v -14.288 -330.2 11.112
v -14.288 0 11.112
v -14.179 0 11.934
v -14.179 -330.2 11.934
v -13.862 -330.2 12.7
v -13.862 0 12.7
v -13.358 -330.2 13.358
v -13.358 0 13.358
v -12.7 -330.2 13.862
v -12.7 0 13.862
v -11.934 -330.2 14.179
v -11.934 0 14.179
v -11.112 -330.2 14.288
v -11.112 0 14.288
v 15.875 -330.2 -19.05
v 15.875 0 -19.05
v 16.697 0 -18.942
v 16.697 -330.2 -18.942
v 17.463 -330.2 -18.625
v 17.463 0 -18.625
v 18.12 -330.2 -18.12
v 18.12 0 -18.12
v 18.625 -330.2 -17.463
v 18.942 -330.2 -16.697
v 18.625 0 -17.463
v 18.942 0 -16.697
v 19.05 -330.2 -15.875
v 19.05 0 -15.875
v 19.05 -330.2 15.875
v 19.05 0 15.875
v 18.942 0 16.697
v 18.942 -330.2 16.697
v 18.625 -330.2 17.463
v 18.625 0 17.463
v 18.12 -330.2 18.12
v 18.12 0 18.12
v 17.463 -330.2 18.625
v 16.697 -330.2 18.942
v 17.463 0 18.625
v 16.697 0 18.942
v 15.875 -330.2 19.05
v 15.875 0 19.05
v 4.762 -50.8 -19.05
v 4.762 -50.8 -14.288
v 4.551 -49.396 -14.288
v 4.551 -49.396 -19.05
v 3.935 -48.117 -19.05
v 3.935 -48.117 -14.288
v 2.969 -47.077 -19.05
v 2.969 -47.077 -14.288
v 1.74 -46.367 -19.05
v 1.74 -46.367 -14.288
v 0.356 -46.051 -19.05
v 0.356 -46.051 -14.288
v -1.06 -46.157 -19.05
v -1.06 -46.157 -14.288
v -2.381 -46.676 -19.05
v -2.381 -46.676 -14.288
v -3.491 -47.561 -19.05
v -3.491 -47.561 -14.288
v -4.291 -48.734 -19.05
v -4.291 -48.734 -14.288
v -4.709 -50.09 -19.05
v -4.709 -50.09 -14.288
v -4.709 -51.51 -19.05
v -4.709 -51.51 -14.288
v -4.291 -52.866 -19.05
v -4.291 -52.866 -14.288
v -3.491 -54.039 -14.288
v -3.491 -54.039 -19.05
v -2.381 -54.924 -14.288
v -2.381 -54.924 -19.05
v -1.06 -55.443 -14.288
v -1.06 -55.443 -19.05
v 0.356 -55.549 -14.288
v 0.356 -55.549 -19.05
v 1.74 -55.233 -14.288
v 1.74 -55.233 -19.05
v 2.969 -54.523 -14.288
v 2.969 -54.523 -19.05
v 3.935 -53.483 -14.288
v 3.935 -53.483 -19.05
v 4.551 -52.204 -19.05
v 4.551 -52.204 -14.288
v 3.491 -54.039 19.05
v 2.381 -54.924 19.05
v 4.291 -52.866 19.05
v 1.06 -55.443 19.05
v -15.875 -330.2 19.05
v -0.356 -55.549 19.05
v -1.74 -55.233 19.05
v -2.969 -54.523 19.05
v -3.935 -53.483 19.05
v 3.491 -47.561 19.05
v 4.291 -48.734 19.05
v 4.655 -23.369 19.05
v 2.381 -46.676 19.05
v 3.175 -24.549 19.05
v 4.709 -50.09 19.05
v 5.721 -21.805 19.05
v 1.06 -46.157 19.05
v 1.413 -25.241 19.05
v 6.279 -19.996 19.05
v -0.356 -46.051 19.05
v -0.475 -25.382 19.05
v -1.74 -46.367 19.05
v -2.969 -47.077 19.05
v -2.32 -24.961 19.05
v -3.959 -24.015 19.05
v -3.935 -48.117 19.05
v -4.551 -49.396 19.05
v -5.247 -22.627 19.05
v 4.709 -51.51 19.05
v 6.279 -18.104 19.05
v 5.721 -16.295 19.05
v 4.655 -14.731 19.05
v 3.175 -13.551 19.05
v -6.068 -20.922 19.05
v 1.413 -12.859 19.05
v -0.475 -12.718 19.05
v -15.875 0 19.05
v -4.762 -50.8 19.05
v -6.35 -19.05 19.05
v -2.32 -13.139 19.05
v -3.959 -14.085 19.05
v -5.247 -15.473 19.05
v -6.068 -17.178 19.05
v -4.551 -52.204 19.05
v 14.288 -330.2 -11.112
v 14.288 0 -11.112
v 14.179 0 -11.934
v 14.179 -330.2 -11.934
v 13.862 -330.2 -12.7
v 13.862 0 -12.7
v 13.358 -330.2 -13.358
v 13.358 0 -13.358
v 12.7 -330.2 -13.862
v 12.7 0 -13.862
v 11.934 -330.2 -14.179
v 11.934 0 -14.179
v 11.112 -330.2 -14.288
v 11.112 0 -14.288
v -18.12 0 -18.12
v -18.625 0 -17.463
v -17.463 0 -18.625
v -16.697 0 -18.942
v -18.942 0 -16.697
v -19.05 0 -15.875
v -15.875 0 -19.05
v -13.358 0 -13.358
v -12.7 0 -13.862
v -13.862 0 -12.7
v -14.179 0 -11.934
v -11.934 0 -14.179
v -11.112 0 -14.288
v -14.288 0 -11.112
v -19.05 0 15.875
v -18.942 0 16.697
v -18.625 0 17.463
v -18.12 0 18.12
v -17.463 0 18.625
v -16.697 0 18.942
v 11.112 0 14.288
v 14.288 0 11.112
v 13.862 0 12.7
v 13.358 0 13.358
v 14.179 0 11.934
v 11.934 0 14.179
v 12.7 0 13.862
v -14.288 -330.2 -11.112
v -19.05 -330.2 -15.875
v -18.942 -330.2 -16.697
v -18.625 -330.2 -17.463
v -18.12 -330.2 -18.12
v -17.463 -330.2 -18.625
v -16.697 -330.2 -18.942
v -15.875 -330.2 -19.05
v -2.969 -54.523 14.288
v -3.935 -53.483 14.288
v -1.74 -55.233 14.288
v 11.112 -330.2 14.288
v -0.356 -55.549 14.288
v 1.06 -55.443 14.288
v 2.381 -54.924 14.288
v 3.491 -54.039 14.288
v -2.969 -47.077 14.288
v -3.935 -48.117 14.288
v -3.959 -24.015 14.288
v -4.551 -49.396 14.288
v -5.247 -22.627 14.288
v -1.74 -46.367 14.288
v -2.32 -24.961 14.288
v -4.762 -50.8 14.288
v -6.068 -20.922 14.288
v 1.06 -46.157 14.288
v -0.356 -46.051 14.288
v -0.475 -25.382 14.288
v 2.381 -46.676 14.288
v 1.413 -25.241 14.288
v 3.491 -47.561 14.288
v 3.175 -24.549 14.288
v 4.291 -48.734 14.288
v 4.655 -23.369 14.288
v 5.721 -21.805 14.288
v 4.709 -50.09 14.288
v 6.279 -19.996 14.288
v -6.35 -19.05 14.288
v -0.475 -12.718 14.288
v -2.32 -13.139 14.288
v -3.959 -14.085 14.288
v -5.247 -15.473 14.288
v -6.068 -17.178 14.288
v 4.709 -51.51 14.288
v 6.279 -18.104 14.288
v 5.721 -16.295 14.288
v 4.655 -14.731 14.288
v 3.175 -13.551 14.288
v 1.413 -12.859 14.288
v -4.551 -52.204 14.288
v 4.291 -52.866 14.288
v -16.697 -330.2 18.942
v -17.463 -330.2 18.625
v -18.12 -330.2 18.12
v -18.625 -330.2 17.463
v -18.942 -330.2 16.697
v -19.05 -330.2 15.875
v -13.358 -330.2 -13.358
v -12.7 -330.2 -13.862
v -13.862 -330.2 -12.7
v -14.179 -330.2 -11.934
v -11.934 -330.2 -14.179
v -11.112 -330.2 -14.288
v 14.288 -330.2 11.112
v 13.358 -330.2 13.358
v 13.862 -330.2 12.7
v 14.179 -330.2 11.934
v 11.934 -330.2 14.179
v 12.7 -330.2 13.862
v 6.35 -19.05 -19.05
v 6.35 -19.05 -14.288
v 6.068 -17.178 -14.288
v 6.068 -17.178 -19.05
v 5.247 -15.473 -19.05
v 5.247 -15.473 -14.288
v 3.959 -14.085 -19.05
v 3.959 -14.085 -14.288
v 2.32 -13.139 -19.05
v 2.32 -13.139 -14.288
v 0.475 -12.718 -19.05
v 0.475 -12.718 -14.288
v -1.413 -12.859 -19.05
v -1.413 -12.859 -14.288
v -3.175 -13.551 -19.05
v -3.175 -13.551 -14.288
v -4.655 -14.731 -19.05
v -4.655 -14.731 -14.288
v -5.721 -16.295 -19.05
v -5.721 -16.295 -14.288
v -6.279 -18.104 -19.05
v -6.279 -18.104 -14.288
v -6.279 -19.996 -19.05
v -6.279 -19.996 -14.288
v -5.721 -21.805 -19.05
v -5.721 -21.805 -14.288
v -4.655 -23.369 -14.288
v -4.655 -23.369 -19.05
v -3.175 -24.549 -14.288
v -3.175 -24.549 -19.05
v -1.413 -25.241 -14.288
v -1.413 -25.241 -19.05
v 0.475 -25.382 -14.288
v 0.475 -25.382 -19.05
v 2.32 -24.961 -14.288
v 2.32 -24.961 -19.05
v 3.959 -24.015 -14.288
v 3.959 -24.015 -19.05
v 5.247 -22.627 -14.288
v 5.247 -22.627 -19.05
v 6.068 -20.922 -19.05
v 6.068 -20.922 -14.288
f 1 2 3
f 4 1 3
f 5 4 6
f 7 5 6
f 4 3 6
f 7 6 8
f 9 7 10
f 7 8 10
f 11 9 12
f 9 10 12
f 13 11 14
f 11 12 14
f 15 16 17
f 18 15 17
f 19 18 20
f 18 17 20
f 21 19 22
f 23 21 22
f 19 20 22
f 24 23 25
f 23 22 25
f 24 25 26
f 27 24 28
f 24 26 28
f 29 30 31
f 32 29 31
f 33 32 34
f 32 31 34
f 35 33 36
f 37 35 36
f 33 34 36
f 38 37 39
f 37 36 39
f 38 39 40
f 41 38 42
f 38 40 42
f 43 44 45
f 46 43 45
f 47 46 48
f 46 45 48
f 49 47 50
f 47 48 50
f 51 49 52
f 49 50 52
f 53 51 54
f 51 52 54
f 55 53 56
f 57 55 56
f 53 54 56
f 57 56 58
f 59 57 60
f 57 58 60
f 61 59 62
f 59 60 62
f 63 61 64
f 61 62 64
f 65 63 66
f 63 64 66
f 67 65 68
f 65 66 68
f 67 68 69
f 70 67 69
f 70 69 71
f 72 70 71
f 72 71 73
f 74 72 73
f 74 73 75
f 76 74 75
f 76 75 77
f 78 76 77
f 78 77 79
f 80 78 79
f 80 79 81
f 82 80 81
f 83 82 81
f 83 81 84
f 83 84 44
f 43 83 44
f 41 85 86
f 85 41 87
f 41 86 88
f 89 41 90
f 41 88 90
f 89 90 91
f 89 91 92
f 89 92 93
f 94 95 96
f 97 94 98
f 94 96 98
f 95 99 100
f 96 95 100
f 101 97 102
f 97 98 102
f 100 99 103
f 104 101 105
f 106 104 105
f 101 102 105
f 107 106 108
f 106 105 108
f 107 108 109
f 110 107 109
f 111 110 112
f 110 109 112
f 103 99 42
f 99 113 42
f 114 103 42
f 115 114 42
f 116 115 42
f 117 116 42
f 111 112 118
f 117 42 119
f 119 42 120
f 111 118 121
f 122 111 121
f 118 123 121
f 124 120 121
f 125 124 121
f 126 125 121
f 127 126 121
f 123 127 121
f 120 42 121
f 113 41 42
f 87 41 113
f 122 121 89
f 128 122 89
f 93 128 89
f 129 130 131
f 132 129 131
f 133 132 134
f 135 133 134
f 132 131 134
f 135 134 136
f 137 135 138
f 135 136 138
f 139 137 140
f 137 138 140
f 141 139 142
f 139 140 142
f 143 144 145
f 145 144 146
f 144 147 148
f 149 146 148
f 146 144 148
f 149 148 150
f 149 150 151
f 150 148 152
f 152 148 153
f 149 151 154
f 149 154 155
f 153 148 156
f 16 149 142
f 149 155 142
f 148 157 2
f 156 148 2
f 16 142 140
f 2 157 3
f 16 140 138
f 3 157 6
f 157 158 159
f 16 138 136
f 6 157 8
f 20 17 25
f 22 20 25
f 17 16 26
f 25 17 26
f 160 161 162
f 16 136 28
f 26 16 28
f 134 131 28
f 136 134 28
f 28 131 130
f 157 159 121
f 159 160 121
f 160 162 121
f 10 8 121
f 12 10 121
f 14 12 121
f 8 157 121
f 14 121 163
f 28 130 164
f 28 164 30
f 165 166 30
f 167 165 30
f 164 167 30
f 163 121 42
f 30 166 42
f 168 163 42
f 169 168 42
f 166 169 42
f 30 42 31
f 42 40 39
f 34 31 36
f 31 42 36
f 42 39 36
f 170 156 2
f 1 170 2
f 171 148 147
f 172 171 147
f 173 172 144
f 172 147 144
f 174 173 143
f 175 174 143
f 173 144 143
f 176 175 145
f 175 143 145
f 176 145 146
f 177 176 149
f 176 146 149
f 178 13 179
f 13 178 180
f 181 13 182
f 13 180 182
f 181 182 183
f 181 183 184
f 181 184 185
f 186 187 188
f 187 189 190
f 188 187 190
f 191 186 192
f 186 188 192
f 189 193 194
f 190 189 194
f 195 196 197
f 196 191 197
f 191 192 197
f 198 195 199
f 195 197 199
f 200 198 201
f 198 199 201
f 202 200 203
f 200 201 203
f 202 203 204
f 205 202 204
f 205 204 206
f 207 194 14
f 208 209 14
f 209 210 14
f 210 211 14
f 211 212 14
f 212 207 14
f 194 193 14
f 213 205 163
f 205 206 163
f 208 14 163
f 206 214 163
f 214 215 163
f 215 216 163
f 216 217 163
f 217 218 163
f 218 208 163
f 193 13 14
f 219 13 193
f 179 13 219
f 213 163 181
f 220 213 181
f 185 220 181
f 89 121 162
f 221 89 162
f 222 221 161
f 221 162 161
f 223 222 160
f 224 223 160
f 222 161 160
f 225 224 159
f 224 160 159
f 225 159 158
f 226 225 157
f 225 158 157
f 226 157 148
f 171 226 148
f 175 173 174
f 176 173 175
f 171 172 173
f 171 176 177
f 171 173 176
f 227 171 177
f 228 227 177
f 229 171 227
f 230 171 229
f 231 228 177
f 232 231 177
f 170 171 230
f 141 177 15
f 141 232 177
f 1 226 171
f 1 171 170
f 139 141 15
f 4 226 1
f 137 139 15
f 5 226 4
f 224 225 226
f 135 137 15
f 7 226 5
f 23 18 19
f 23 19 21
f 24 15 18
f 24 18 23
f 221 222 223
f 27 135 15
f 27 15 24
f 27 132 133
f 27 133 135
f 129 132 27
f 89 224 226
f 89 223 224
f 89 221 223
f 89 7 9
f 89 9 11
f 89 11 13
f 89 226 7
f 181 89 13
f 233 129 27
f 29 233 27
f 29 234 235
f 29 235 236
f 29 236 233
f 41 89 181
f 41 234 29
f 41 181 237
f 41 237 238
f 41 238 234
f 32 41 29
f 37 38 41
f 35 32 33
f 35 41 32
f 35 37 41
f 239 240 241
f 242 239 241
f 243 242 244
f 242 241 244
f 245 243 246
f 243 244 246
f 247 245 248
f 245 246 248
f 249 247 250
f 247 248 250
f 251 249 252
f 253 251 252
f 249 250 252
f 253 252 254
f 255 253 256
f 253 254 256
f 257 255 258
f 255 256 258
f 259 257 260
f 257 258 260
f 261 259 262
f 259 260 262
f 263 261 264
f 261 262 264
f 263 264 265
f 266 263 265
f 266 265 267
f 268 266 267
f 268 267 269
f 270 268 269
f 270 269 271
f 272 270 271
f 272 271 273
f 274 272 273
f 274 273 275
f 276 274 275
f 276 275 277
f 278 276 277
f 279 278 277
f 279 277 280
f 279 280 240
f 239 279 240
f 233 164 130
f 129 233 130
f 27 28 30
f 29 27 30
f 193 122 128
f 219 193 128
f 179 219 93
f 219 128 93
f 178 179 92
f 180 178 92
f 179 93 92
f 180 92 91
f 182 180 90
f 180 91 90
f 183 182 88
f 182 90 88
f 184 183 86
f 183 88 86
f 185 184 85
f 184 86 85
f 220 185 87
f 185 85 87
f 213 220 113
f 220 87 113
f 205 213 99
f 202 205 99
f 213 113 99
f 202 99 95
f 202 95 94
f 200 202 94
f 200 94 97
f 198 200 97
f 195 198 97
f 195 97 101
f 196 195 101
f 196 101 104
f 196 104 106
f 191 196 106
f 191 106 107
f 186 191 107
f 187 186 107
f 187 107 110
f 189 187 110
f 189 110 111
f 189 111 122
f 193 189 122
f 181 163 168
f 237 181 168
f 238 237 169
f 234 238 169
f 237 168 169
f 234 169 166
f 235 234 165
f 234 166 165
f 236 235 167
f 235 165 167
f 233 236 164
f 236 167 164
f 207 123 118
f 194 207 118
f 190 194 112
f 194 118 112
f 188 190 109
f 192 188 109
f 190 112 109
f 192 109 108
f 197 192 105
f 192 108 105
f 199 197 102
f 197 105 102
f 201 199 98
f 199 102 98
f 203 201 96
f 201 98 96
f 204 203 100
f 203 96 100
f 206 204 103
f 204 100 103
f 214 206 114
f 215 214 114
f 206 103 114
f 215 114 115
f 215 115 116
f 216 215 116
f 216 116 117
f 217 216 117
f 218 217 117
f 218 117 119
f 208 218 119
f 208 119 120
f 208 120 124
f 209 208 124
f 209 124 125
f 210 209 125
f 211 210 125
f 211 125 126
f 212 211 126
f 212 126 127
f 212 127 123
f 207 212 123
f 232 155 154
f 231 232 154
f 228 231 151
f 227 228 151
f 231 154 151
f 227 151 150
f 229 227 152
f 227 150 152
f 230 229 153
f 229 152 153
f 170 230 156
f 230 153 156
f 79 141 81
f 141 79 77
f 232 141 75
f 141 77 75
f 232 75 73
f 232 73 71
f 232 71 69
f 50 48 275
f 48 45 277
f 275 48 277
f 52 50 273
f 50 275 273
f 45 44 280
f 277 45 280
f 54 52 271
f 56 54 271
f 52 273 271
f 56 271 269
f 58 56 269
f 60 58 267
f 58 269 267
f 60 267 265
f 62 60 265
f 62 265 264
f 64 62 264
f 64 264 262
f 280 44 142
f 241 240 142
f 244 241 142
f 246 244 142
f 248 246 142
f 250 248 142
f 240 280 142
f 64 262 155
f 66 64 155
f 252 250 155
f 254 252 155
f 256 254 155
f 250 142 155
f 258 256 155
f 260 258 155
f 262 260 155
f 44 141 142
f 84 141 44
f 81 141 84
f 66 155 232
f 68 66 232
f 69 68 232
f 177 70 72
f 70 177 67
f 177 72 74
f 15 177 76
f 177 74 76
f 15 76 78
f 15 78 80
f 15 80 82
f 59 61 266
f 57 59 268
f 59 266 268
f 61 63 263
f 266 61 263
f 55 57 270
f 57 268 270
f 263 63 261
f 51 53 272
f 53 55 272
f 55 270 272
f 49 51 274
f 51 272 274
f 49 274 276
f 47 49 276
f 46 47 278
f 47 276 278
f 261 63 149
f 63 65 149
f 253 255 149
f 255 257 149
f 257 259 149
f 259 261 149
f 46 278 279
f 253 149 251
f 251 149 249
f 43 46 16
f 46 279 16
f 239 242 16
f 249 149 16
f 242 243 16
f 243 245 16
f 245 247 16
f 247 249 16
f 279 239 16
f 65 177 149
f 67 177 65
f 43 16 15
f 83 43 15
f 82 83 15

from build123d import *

# Parameters (mm, degrees)
F3_DEPTH = 330.2
F4_D     = 12.7
F4_DEPTH = 19.051
F5_D     = 12.7
F6_D     = 9.525
F6_DEPTH = 19.051
F2_D     = 9.525


with BuildPart() as f3:
    # F0 (on Front) → F3 (new body)
    with BuildSketch(Plane.XZ):
        with BuildLine():
            Line((-15.875, -19.05), (15.875, -19.05))
            ThreePointArc((15.875, -19.05), (18.1200640303, -18.1200640303), (19.05, -15.875))
            Line((19.05, -15.875), (19.05, 15.875))
            ThreePointArc((19.05, 15.875), (18.1200640303, 18.1200640303), (15.875, 19.05))
            Line((15.875, 19.05), (-15.875, 19.05))
            ThreePointArc((-15.875, 19.05), (-18.1200640303, 18.1200640303), (-19.05, 15.875))
            Line((-19.05, 15.875), (-19.05, -15.875))
            ThreePointArc((-19.05, -15.875), (-18.1200640303, -18.1200640303), (-15.875, -19.05))
        make_face()
        with BuildLine():
            ThreePointArc((14.2875, -11.1125), (13.3575640303, -13.3575640303), (11.1125, -14.2875))
            Line((11.1125, -14.2875), (-11.1125, -14.2875))
            ThreePointArc((-11.1125, -14.2875), (-13.3575640303, -13.3575640303), (-14.2875, -11.1125))
            Line((-14.2875, -11.1125), (-14.2875, 11.1125))
            ThreePointArc((-14.2875, 11.1125), (-13.3575640303, 13.3575640303), (-11.1125, 14.2875))
            Line((-11.1125, 14.2875), (11.1125, 14.2875))
            ThreePointArc((11.1125, 14.2875), (13.3575640303, 13.3575640303), (14.2875, 11.1125))
            Line((14.2875, 11.1125), (14.2875, -11.1125))
        make_face(mode=Mode.SUBTRACT)
    extrude(amount=F3_DEPTH)

    # F4 (through all, one way)
    with BuildSketch(Plane.XY):
        with Locations((0, -19.05)):
            Circle(F4_D / 2)
    extrude(amount=-F4_DEPTH, mode=Mode.SUBTRACT)

    # F5 (through all)
    with Locations(Plane(origin=(0, 0, 0), x_dir=(1, 0, 0), z_dir=(0, 0, -1))):
        with Locations((0, 19.05)):
            Hole(F5_D / 2)

    # F6 (through all, one way)
    with BuildSketch(Plane.XY):
        with Locations((0, -50.8)):
            Circle(F6_D / 2)
    extrude(amount=-F6_DEPTH, mode=Mode.SUBTRACT)

    # F2 (through all)
    with Locations(Plane(origin=(0, 0, 0), x_dir=(1, 0, 0), z_dir=(0, 0, -1))):
        with Locations((0, 50.8)):
            Hole(F2_D / 2)


solid = f3.part
